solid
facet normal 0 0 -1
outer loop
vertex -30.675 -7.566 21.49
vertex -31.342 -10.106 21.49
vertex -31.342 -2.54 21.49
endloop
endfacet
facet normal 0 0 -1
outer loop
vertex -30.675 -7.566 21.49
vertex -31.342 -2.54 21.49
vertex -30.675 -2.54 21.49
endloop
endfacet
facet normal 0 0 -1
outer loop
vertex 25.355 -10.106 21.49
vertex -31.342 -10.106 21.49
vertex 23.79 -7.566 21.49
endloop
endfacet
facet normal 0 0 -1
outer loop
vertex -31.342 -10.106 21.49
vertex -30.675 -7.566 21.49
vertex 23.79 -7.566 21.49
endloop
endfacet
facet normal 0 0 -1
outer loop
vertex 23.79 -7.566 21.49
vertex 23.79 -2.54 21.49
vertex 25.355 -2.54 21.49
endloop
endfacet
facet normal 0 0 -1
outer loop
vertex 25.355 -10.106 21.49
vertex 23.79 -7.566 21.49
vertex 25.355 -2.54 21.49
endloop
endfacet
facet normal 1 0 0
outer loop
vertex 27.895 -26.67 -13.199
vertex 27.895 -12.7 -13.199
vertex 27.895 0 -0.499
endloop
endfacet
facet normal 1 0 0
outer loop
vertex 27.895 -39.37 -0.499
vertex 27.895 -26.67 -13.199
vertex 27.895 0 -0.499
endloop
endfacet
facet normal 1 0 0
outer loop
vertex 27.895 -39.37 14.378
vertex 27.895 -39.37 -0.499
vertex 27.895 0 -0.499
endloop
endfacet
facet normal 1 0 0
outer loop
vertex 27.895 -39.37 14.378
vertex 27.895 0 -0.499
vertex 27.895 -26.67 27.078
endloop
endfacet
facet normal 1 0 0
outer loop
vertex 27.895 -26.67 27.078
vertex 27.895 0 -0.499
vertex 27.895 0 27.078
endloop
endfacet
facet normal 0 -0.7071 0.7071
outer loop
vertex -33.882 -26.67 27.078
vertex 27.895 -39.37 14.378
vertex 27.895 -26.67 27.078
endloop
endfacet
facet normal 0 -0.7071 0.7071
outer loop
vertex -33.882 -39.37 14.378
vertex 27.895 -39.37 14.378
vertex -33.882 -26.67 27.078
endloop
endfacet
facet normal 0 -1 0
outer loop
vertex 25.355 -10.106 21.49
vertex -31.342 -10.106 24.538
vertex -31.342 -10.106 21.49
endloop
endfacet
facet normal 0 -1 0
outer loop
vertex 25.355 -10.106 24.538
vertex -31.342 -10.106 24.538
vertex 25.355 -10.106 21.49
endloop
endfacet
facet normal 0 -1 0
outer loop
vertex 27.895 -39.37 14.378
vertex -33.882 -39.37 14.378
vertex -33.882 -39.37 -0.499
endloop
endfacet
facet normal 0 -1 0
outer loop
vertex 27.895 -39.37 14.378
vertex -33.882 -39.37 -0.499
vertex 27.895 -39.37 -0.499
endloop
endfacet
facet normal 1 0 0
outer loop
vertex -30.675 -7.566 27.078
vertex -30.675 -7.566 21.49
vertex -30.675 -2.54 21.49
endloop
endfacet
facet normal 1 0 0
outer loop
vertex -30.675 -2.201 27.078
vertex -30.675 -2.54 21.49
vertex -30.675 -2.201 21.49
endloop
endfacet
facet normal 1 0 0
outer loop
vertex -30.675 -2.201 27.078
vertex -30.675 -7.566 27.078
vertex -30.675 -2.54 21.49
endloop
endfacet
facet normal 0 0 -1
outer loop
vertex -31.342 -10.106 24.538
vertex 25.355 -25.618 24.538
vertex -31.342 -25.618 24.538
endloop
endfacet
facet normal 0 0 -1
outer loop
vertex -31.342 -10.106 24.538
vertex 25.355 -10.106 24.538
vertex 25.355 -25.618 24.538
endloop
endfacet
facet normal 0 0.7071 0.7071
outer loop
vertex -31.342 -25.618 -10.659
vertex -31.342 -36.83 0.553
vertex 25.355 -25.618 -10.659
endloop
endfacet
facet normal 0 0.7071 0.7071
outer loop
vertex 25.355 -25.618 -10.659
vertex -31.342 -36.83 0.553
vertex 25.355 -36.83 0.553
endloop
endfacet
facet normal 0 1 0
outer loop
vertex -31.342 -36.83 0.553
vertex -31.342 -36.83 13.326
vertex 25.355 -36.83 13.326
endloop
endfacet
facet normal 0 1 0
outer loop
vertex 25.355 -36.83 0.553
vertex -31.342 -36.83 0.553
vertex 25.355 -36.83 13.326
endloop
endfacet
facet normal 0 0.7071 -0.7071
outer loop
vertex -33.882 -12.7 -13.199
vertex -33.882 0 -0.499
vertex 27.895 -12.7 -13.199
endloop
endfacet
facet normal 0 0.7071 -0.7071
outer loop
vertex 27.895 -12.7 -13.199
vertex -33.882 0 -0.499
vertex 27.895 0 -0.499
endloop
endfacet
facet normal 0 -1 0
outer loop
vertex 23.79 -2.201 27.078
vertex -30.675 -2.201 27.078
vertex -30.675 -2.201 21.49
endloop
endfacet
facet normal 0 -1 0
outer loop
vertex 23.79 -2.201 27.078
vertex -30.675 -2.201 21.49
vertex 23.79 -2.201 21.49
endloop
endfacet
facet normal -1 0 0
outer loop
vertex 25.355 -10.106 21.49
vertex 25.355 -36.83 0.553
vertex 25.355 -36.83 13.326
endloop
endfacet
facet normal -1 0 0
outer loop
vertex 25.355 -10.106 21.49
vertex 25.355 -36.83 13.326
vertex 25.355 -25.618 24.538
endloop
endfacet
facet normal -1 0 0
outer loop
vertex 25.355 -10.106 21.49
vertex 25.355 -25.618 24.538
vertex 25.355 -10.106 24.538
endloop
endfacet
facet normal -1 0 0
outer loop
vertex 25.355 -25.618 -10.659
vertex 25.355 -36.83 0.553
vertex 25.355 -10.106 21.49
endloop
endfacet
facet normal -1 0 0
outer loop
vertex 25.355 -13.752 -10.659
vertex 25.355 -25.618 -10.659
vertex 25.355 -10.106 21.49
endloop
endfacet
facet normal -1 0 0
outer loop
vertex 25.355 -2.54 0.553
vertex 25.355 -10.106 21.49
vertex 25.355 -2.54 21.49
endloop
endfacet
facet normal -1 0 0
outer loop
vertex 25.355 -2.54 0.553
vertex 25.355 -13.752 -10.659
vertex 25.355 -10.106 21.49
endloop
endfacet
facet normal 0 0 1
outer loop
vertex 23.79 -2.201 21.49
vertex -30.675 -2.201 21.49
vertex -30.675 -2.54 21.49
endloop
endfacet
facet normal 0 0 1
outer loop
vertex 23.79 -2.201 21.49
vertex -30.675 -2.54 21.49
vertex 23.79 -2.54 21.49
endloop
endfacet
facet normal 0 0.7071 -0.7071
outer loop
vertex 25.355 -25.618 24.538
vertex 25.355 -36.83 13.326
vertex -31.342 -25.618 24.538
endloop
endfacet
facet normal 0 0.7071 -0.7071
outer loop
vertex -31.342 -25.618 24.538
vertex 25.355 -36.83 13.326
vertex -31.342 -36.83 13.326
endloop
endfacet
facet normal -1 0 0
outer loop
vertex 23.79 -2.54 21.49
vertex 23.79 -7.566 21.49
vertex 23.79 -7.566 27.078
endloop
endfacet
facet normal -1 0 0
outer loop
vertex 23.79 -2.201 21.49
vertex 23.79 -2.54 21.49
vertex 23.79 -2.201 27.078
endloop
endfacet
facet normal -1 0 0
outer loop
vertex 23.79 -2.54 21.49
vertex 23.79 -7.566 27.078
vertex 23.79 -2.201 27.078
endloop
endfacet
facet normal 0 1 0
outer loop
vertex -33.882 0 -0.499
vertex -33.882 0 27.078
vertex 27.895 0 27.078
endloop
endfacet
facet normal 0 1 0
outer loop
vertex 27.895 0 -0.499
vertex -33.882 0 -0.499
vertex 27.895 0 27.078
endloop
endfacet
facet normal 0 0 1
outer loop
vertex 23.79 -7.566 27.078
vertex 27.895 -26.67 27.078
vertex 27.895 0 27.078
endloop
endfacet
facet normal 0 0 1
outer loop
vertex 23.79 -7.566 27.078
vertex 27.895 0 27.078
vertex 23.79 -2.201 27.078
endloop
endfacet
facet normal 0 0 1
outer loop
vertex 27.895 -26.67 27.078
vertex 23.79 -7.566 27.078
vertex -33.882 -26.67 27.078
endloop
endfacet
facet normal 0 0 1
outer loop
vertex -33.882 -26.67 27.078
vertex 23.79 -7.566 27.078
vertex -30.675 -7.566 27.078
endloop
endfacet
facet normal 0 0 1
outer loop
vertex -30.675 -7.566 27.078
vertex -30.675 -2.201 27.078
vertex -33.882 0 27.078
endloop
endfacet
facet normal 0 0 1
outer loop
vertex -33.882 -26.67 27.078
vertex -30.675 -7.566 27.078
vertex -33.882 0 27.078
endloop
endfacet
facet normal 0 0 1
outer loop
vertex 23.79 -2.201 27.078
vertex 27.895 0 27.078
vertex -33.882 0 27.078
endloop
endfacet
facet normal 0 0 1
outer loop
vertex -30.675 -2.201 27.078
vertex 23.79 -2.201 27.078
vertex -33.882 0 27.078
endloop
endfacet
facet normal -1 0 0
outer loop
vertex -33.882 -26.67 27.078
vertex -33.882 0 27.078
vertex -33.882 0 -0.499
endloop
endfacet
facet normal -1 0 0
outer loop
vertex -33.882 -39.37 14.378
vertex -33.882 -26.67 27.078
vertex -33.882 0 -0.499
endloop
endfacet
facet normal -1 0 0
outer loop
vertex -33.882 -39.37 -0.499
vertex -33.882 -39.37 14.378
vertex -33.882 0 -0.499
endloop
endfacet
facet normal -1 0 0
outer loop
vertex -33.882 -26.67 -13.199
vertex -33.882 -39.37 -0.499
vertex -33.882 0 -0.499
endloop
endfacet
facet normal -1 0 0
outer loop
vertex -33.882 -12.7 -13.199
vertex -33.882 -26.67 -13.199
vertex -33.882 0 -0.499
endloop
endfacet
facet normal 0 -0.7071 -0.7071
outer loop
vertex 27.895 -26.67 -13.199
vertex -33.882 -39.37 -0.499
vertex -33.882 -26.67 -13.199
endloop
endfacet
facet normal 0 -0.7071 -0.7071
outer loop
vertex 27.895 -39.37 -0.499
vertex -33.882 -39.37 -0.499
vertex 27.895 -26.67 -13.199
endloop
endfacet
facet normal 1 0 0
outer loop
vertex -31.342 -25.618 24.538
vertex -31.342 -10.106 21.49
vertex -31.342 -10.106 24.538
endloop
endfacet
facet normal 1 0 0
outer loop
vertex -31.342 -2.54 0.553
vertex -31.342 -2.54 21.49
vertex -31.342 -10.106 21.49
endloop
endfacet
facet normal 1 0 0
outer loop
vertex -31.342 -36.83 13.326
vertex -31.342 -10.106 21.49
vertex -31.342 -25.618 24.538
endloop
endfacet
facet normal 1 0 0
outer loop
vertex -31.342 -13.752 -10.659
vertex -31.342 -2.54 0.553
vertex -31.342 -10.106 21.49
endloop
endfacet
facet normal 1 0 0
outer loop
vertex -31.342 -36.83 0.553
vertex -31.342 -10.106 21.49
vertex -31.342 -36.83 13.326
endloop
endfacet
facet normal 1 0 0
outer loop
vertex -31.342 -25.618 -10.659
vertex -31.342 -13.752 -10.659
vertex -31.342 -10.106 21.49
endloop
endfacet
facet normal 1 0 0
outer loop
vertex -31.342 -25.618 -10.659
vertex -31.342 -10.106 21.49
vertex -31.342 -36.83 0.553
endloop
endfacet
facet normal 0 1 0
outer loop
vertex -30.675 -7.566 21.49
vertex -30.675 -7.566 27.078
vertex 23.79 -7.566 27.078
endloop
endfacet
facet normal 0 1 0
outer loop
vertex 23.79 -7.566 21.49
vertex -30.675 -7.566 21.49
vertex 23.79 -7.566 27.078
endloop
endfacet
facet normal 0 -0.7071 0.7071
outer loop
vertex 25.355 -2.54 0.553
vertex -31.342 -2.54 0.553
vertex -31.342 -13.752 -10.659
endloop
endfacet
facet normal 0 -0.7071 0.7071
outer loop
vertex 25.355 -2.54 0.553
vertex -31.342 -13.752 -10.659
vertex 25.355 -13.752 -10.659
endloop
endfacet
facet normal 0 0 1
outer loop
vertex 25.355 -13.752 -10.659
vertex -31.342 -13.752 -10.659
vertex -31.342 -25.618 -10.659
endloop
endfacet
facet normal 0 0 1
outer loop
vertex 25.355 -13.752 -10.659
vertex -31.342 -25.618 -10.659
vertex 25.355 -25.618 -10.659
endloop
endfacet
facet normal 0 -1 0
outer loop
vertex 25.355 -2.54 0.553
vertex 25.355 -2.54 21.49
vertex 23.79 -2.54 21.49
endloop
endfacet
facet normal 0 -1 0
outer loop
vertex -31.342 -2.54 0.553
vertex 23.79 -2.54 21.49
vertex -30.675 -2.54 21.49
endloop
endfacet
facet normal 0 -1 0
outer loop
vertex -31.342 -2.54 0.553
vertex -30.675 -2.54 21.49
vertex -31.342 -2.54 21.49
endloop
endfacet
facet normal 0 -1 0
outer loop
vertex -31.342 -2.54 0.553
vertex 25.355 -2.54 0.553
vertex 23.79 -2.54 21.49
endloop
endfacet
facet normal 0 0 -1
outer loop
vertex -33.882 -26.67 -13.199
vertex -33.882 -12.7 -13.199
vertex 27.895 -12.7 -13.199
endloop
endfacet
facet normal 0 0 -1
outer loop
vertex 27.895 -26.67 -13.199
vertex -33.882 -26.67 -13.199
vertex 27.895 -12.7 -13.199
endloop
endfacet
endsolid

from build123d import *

# Parameters (mm, degrees)
F1_DEPTH = 39.37
F2_SIZE  = 12.7
F3_W     = 54.4642563909
F3_H     = 5.3648606408
F4_DEPTH = 5.588
F5_T     = -2.54


# Not quite as in the source:
# - a shell that OpenCascade refuses in one call is made with other operations: the cavity is built on its own and cut out


with BuildPart() as f1:
    # F0 (on Front) → F1 (new body)
    with BuildSketch(Plane.XZ):
        Polygon((-33.8817872107, 27.0782150328), (-33.8817872107, -13.1989289075), (27.8946403414, -13.1989289075), (27.8946403414, 27.0782150328), (0, 27.0782150328), (-9.9332146347, 27.0782150328), align=None)
    extrude(amount=F1_DEPTH)

    # F2
    f2_edges = [f1.edges().sort_by_distance(p)[0] for p in [
        (-2.993573, -39.37, -13.198929),
        (-2.993573, -39.37, 27.078215),
        (-2.993573, 0, -13.198929),
    ]]
    chamfer(f2_edges, length=F2_SIZE)

    # F3 (on face) → F4 (cut)
    with BuildSketch(Plane.XY.offset(27.0782150328)):
        with Locations((-3.4423777834, -4.8837963259)):
            Rectangle(F3_W, F3_H)
    extrude(amount=-F4_DEPTH, mode=Mode.SUBTRACT)

    # F5: a shell. OpenCascade refuses it in one call, so the cavity is built on its own and cut out:
    # the body offset inwards by the wall thickness, plus a prism from it out through each open face.
    f5_core = offset(f1.part, amount=F5_T, kind=Kind.INTERSECTION, mode=Mode.PRIVATE)
    f5_exits = [f5_core.faces().sort_by_distance(p)[0] for p in [
        (-2.993573, -6.323113, 18.950215),
    ]]
    add(f5_core, mode=Mode.SUBTRACT)
    extrude(f5_exits, amount=-F5_T, mode=Mode.SUBTRACT)


solid = f1.part
